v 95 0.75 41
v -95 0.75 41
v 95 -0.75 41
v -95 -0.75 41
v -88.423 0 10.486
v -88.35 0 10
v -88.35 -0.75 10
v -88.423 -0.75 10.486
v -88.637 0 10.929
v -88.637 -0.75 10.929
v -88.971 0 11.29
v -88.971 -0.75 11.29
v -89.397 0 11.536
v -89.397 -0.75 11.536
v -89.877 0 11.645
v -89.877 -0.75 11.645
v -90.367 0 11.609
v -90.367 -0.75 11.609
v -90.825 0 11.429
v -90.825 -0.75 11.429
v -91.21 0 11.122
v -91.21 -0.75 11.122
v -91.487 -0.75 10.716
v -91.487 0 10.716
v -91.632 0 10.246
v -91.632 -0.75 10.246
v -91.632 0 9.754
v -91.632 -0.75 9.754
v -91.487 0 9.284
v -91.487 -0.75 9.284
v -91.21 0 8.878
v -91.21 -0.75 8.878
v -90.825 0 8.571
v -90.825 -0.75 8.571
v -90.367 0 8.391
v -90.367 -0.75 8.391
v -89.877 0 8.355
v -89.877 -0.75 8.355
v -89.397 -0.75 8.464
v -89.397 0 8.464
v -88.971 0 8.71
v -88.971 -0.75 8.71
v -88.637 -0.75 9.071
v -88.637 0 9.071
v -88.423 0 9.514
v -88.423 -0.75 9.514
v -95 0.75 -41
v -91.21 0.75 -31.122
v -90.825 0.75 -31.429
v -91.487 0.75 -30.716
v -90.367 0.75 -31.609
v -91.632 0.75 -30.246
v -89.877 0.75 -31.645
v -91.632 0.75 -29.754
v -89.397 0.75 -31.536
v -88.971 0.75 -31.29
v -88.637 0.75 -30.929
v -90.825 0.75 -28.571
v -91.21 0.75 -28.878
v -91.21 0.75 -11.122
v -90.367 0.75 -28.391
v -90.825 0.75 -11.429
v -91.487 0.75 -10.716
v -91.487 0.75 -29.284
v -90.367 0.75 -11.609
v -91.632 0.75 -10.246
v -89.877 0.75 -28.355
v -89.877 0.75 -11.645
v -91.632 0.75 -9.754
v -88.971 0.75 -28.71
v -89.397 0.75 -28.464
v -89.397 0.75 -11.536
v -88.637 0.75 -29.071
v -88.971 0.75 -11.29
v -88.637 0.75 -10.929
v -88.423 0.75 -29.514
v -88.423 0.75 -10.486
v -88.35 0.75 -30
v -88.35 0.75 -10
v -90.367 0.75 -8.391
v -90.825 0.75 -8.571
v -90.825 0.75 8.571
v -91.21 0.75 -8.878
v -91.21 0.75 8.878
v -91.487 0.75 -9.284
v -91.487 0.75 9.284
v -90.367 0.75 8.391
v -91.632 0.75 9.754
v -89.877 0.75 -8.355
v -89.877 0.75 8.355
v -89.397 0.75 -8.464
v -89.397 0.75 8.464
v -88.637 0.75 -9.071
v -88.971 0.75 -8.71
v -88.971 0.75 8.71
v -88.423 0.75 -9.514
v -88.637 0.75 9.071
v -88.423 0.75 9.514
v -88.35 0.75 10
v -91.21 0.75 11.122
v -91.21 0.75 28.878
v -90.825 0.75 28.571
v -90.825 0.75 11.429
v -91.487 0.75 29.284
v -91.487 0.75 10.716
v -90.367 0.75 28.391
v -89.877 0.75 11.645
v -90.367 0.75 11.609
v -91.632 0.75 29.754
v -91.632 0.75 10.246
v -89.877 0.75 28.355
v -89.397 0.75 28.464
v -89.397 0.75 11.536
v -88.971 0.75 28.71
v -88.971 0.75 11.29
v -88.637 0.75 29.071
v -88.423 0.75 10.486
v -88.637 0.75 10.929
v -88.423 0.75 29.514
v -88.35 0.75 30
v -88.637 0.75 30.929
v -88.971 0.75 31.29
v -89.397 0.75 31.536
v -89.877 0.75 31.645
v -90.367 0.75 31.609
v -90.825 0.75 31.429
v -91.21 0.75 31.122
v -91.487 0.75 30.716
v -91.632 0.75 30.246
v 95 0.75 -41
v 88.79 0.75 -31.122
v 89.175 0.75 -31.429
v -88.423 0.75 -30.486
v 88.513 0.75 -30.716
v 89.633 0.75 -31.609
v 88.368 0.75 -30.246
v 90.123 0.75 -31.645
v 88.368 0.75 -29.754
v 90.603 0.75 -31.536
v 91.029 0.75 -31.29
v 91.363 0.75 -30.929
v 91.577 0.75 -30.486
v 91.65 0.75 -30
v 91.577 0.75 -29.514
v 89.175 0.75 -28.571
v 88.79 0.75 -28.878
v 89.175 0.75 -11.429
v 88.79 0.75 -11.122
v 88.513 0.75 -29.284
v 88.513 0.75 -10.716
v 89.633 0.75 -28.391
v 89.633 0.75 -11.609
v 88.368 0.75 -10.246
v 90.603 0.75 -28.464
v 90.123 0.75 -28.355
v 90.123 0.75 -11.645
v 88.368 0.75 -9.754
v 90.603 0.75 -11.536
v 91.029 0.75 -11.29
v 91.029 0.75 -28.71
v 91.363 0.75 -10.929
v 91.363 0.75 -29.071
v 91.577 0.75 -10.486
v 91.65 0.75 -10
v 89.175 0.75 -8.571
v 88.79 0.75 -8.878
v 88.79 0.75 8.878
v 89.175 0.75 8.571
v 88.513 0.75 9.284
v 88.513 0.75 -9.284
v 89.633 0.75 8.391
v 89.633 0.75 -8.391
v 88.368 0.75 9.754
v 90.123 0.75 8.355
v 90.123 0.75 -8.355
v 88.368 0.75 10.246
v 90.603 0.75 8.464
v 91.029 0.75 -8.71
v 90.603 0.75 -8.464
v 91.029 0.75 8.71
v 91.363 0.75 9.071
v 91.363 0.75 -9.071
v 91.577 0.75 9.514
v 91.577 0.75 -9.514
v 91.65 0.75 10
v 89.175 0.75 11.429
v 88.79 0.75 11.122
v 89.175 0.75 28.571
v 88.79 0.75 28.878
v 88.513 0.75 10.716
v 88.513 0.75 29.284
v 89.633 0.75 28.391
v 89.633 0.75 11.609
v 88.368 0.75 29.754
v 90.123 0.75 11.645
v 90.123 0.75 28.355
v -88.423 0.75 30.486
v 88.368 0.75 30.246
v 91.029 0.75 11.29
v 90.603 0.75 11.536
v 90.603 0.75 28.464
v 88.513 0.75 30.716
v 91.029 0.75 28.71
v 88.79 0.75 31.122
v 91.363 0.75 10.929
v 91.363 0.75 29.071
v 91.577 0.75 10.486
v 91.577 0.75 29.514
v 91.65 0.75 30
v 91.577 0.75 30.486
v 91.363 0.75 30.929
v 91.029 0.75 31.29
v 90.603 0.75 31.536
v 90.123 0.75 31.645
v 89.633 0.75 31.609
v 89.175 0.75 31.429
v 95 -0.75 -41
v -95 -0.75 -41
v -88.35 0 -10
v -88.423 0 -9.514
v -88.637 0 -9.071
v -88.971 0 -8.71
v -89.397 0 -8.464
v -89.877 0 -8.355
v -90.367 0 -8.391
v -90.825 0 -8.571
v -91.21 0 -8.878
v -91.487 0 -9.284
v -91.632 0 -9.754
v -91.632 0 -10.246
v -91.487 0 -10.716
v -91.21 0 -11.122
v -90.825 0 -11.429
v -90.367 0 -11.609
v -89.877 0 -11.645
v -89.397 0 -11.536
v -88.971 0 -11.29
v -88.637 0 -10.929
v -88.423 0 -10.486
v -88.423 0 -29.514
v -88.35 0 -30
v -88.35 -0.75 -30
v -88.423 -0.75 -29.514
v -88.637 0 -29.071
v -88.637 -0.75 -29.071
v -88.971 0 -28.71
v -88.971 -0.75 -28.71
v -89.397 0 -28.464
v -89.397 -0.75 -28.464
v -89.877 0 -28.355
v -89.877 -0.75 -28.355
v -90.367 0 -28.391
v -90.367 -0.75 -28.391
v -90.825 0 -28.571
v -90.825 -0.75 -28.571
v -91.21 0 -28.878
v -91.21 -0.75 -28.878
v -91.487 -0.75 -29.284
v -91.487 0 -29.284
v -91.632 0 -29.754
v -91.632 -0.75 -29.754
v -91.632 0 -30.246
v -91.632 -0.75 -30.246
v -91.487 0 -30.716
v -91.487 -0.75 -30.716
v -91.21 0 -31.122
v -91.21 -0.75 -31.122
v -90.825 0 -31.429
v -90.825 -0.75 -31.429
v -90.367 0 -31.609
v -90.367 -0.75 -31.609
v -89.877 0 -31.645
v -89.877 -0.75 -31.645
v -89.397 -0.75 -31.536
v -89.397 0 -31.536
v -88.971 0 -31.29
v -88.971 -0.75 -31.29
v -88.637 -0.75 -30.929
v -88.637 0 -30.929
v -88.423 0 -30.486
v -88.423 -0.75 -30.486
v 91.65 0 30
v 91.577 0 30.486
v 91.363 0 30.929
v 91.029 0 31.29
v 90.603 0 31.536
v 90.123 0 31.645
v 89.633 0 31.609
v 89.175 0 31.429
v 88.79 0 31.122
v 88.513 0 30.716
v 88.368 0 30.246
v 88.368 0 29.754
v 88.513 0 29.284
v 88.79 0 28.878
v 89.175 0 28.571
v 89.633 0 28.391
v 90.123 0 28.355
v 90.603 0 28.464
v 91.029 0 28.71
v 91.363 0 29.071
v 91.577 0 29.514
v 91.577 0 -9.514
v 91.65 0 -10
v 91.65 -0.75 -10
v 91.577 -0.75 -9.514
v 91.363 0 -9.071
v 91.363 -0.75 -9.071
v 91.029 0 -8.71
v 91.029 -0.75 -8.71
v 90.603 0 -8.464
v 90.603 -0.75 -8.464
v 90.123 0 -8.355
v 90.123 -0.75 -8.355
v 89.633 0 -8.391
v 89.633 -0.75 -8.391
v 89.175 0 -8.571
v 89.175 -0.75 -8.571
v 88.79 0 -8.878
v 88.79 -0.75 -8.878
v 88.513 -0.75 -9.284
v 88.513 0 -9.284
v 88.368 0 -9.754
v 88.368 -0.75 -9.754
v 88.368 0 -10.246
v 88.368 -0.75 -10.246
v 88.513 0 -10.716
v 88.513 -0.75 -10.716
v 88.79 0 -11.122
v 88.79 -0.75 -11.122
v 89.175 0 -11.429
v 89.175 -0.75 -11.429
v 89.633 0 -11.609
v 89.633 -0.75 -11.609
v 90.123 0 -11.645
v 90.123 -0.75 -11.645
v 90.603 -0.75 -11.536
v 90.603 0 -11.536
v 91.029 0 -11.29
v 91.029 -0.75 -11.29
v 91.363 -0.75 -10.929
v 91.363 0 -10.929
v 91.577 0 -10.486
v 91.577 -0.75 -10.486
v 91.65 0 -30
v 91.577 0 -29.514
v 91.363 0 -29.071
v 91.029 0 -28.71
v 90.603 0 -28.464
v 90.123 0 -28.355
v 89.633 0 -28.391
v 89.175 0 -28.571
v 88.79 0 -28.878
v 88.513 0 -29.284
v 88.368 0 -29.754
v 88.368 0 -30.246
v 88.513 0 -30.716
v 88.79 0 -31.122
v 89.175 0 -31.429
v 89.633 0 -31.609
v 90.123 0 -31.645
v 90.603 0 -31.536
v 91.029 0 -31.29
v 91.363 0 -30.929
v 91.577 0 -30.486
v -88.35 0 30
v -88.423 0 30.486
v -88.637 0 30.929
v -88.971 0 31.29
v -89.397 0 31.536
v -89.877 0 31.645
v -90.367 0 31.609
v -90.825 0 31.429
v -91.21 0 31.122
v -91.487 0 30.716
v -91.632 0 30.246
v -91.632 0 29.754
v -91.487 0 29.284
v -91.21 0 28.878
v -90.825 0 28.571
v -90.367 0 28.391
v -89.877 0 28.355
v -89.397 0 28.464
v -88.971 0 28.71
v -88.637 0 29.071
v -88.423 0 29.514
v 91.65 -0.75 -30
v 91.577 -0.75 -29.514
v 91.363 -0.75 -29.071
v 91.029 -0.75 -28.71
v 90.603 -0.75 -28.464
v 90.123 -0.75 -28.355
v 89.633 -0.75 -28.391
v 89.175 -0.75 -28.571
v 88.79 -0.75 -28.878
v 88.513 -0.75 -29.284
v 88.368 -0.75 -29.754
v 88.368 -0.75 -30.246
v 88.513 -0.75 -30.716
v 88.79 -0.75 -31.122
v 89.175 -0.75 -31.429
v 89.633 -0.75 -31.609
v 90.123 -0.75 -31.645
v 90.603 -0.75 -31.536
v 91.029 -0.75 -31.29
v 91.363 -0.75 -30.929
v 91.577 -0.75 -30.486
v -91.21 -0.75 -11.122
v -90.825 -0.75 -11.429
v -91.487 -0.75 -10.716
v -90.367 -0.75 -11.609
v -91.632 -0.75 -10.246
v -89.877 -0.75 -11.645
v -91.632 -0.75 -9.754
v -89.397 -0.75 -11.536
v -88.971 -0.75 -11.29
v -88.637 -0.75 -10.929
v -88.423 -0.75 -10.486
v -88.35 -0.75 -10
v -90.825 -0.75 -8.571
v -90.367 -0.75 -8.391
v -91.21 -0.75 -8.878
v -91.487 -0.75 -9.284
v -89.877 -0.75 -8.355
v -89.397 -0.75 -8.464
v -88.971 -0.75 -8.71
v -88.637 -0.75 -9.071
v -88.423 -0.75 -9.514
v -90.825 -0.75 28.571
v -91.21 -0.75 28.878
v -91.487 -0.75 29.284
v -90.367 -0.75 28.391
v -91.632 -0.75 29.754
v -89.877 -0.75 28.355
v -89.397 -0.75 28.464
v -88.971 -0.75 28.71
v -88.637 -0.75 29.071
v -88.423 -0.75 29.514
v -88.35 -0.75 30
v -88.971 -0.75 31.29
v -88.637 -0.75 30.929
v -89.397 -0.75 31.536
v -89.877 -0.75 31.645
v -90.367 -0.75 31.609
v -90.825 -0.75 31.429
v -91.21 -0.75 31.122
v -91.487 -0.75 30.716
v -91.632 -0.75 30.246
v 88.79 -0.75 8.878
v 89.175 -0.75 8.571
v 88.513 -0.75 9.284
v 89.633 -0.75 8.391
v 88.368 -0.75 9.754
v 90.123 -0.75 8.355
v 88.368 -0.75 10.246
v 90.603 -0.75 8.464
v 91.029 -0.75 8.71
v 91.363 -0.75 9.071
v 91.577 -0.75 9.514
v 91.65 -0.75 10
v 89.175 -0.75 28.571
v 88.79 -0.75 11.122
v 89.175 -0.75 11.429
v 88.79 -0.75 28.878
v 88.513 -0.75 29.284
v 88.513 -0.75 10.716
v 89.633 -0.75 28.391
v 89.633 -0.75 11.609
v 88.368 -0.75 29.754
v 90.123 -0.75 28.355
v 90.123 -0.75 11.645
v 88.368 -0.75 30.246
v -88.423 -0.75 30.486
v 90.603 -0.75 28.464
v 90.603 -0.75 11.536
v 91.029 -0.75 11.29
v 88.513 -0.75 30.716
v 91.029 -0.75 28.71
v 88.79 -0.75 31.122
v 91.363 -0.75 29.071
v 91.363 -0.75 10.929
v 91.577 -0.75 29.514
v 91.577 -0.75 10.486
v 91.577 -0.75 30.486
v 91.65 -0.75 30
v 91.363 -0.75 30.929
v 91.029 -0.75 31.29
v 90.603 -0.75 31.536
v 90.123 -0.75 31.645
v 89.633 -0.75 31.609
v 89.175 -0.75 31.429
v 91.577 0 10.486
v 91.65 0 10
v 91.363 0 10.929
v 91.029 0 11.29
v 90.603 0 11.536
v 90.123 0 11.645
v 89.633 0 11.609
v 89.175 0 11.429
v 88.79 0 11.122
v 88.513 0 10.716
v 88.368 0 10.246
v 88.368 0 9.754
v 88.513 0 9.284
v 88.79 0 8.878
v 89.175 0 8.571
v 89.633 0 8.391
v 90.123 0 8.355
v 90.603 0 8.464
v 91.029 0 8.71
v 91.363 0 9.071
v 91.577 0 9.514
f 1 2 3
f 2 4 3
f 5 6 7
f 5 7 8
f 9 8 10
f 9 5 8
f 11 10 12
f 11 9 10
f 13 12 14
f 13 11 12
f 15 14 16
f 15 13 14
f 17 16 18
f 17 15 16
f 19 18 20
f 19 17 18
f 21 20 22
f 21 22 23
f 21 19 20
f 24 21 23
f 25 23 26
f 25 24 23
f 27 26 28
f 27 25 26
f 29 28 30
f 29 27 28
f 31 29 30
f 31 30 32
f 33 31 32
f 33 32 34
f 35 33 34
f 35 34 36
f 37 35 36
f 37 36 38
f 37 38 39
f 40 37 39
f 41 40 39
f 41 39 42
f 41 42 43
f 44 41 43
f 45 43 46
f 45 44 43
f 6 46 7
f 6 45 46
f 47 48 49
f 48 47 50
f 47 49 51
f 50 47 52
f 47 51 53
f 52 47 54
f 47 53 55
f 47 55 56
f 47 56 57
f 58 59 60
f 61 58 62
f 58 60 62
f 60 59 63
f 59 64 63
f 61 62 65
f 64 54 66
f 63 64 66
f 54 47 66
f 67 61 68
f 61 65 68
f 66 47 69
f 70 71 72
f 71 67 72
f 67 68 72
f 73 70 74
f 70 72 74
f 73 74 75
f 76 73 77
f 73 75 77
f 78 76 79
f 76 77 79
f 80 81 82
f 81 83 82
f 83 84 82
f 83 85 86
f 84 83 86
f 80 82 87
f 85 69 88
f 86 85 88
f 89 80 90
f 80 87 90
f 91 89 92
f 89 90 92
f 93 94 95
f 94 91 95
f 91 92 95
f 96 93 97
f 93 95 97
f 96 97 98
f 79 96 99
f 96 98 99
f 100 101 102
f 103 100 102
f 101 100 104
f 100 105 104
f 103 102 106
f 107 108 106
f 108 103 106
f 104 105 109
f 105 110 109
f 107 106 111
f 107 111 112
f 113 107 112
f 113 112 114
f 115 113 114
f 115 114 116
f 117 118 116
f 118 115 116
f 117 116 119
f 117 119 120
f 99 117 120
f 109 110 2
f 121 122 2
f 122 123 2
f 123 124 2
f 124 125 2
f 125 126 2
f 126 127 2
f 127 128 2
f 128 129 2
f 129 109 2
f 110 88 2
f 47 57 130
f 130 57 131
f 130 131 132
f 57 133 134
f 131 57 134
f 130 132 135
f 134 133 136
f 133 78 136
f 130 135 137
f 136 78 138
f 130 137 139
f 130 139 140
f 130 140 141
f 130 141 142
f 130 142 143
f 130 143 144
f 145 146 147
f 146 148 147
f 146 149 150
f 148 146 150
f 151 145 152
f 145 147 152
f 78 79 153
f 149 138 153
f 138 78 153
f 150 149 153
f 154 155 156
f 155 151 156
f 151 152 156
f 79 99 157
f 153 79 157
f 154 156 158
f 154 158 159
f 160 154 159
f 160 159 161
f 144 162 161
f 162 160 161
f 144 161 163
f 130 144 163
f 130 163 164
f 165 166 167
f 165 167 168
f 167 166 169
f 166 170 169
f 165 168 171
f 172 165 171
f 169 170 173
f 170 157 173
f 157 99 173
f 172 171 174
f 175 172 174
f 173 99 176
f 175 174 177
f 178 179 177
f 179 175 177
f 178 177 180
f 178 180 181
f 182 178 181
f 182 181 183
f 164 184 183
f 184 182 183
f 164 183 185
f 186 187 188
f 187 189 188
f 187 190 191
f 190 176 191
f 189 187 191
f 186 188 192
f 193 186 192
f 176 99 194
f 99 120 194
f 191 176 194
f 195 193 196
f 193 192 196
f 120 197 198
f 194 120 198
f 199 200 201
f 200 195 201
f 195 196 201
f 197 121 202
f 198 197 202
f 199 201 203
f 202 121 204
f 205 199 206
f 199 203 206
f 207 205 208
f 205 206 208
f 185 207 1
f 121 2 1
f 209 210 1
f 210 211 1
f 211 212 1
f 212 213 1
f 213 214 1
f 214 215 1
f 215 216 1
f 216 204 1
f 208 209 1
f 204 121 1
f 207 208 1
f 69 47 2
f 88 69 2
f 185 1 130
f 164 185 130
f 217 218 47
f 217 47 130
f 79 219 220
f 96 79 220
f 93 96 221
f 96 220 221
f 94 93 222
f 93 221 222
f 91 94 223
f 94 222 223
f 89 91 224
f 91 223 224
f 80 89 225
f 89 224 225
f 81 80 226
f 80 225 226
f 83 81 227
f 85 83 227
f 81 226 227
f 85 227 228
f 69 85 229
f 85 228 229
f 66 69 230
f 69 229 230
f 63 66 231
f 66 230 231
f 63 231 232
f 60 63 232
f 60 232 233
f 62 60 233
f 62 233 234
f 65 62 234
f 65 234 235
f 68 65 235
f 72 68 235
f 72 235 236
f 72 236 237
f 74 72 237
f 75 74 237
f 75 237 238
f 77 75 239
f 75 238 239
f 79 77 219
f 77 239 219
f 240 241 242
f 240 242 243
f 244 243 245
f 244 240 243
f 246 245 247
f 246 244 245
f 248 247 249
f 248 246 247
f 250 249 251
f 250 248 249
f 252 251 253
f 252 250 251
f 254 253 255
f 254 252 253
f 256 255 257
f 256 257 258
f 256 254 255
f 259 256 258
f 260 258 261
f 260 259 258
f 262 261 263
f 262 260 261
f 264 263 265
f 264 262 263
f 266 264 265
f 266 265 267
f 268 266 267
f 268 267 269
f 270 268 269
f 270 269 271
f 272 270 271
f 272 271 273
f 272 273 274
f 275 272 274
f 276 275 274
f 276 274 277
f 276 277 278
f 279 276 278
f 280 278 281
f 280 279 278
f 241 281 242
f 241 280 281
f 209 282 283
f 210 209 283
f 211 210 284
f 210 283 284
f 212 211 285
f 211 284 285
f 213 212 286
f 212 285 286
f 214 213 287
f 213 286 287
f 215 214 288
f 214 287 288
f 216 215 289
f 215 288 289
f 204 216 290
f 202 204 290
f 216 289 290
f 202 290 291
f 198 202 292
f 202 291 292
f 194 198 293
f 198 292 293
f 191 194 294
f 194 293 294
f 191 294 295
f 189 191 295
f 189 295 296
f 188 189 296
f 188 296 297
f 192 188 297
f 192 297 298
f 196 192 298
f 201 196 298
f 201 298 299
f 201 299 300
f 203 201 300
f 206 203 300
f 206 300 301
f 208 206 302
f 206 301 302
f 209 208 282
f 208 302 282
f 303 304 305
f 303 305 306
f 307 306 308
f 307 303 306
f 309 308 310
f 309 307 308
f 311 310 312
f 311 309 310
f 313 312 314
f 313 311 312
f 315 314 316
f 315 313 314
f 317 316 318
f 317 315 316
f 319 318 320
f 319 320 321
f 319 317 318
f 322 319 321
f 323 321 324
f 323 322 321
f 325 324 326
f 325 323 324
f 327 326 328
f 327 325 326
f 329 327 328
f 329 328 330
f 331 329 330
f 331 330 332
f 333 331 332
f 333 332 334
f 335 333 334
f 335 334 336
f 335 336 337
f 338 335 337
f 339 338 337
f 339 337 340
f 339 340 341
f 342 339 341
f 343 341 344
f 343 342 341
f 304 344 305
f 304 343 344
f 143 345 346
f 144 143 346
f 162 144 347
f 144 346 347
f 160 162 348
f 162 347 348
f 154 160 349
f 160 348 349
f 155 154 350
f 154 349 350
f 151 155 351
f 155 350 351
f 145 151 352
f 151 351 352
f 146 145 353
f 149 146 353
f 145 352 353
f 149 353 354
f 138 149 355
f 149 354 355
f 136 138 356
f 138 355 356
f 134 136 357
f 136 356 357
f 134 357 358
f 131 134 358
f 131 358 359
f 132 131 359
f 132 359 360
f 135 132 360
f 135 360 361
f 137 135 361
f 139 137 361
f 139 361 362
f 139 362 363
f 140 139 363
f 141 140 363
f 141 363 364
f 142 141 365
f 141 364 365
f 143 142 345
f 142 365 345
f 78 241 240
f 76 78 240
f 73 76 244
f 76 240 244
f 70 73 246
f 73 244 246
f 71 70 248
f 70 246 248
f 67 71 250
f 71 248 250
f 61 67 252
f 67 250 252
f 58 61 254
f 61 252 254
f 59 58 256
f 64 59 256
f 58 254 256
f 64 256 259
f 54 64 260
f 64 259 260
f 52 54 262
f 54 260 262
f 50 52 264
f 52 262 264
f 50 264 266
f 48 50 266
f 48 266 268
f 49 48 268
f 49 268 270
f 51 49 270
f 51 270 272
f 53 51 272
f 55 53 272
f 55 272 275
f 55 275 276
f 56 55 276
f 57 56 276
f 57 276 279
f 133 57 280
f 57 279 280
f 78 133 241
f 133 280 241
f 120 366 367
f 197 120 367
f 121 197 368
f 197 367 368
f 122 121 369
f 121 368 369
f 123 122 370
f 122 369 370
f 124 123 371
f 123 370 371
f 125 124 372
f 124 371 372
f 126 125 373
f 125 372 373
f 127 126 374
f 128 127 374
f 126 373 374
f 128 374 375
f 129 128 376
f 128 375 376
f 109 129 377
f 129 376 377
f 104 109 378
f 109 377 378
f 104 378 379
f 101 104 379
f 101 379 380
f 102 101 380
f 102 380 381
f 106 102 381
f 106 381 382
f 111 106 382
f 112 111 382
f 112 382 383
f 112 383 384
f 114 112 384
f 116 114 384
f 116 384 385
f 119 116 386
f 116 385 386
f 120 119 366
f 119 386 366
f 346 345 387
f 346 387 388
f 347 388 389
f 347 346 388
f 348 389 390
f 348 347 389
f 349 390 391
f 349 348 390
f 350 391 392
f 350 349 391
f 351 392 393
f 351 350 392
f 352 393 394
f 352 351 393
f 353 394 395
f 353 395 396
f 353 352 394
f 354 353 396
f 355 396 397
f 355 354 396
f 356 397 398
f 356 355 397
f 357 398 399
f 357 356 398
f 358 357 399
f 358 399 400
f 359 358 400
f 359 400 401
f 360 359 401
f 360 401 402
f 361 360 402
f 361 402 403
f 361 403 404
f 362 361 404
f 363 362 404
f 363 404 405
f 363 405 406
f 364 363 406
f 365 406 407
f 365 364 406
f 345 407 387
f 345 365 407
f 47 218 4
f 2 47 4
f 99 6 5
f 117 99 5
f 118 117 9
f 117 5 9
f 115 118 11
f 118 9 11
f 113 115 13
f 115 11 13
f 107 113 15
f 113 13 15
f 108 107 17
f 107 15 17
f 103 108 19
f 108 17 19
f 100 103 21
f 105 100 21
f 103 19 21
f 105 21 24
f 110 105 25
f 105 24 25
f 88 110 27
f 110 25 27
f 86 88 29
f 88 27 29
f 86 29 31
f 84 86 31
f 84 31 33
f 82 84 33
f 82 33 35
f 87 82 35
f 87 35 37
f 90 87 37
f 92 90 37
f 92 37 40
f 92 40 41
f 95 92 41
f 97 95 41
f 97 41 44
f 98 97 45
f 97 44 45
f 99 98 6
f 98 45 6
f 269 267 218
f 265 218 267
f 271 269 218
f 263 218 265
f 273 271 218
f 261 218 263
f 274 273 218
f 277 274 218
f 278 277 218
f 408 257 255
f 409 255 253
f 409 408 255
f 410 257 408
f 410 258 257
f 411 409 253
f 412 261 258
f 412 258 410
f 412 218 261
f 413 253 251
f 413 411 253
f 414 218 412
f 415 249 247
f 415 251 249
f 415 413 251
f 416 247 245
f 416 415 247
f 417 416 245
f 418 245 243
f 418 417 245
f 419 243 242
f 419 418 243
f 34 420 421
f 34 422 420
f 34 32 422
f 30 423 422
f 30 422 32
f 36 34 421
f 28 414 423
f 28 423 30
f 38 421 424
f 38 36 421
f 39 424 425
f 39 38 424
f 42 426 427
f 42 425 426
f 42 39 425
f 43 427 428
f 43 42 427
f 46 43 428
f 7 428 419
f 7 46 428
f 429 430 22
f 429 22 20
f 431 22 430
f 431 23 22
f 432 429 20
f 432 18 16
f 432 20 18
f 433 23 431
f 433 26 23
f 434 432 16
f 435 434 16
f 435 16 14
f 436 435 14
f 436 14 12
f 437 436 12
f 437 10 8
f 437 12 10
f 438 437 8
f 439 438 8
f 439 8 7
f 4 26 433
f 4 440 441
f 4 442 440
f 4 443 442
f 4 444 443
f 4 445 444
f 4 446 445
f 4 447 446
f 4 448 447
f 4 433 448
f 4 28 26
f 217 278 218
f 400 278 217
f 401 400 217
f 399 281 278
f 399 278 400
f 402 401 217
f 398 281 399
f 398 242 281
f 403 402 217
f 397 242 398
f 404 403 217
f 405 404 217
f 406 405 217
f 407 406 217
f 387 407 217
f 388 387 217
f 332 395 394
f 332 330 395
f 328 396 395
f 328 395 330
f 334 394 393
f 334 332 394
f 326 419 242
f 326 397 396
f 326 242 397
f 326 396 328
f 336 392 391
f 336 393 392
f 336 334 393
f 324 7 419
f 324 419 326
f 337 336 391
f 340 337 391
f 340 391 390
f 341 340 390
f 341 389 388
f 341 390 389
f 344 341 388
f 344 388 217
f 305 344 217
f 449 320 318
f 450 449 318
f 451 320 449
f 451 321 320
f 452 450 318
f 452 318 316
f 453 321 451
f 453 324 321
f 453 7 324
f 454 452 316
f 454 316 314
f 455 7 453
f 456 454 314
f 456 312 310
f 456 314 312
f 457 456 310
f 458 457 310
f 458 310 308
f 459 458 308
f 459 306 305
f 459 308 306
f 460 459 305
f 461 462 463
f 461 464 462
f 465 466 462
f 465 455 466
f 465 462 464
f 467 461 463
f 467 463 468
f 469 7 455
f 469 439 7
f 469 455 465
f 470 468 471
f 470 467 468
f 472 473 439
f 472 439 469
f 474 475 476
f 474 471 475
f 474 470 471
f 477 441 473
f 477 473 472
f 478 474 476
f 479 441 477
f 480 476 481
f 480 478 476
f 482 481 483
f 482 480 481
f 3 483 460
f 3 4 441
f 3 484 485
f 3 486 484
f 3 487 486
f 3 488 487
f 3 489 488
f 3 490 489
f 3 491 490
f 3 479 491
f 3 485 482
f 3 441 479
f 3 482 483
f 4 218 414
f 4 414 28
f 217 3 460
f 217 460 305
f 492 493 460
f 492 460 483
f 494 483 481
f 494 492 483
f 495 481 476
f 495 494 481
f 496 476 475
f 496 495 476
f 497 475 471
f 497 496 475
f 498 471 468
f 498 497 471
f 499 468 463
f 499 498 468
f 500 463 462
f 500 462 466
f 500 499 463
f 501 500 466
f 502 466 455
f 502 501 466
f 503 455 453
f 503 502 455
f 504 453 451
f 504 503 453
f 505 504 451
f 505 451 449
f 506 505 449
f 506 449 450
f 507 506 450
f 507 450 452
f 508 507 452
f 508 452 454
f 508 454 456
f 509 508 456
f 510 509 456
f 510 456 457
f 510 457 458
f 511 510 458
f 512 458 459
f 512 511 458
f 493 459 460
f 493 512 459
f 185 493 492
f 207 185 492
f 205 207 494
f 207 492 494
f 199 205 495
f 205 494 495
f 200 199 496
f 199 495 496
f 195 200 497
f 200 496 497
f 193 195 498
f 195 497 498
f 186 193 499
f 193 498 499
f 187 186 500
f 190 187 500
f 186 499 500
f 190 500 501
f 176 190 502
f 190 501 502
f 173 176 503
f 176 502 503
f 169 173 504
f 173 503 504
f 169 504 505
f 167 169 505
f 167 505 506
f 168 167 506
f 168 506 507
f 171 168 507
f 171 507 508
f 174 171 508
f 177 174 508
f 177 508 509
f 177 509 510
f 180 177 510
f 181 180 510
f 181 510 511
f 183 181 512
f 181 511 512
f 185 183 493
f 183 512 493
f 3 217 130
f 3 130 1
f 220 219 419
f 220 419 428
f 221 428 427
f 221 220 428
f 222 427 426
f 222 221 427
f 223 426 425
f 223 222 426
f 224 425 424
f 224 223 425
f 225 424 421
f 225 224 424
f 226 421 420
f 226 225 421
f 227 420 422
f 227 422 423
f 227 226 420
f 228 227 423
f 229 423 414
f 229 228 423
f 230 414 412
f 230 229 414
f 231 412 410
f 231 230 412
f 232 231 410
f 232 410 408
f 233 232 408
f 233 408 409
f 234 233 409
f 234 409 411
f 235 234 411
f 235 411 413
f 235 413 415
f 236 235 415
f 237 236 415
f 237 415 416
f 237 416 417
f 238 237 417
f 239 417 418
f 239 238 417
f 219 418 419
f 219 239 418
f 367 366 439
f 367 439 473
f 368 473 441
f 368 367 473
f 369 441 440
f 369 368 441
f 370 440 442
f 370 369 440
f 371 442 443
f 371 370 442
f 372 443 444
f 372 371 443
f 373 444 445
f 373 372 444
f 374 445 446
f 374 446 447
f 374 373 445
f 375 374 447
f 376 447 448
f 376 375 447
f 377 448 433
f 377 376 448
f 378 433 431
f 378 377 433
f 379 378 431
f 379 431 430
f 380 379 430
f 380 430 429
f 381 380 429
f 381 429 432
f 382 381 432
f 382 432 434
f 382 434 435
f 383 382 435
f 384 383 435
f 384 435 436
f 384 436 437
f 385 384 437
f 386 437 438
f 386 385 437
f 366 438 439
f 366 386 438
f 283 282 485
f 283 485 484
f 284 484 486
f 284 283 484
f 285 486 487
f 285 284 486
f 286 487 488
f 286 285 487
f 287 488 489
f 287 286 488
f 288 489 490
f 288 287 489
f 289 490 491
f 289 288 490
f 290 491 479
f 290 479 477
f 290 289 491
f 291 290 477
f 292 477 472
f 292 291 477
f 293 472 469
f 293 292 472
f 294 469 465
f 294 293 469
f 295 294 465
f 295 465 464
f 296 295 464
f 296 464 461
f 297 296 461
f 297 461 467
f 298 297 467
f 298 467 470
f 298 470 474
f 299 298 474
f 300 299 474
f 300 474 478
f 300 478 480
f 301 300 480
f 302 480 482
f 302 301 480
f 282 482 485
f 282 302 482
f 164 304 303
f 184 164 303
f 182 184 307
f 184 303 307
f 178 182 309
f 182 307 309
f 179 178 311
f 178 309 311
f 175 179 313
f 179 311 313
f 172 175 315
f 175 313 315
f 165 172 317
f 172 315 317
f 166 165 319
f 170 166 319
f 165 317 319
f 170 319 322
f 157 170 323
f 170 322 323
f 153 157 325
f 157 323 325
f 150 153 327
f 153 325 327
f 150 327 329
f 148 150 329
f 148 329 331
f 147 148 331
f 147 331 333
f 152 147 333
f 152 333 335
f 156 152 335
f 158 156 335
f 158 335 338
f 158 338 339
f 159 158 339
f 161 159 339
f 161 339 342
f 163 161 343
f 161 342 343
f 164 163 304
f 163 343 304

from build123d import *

# Parameters (mm, degrees)
SKETCH_W       = 190
SKETCH_H       = 82
SKETCH_R       = 1.65
PAD_DEPTH      = 0.75
PAD_DEPTH_BACK = 0.75


with BuildPart() as part:
    # Sketch → Pad (new body, two sides)
    with BuildSketch(Plane.XZ) as pad_sk:
        Rectangle(SKETCH_W, SKETCH_H)
        with Locations((90, 30)):
            Circle(SKETCH_R, mode=Mode.SUBTRACT)
        with Locations((90, 10)):
            Circle(SKETCH_R, mode=Mode.SUBTRACT)
        with Locations((90, -30)):
            Circle(SKETCH_R, mode=Mode.SUBTRACT)
        with Locations((90, -10)):
            Circle(SKETCH_R, mode=Mode.SUBTRACT)
        with Locations((-90, 30)):
            Circle(SKETCH_R, mode=Mode.SUBTRACT)
        with Locations((-90, 10)):
            Circle(SKETCH_R, mode=Mode.SUBTRACT)
        with Locations((-90, -30)):
            Circle(SKETCH_R, mode=Mode.SUBTRACT)
        with Locations((-90, -10)):
            Circle(SKETCH_R, mode=Mode.SUBTRACT)
    extrude(amount=PAD_DEPTH)
    extrude(pad_sk.sketch, amount=-PAD_DEPTH_BACK)


solid = part.part
